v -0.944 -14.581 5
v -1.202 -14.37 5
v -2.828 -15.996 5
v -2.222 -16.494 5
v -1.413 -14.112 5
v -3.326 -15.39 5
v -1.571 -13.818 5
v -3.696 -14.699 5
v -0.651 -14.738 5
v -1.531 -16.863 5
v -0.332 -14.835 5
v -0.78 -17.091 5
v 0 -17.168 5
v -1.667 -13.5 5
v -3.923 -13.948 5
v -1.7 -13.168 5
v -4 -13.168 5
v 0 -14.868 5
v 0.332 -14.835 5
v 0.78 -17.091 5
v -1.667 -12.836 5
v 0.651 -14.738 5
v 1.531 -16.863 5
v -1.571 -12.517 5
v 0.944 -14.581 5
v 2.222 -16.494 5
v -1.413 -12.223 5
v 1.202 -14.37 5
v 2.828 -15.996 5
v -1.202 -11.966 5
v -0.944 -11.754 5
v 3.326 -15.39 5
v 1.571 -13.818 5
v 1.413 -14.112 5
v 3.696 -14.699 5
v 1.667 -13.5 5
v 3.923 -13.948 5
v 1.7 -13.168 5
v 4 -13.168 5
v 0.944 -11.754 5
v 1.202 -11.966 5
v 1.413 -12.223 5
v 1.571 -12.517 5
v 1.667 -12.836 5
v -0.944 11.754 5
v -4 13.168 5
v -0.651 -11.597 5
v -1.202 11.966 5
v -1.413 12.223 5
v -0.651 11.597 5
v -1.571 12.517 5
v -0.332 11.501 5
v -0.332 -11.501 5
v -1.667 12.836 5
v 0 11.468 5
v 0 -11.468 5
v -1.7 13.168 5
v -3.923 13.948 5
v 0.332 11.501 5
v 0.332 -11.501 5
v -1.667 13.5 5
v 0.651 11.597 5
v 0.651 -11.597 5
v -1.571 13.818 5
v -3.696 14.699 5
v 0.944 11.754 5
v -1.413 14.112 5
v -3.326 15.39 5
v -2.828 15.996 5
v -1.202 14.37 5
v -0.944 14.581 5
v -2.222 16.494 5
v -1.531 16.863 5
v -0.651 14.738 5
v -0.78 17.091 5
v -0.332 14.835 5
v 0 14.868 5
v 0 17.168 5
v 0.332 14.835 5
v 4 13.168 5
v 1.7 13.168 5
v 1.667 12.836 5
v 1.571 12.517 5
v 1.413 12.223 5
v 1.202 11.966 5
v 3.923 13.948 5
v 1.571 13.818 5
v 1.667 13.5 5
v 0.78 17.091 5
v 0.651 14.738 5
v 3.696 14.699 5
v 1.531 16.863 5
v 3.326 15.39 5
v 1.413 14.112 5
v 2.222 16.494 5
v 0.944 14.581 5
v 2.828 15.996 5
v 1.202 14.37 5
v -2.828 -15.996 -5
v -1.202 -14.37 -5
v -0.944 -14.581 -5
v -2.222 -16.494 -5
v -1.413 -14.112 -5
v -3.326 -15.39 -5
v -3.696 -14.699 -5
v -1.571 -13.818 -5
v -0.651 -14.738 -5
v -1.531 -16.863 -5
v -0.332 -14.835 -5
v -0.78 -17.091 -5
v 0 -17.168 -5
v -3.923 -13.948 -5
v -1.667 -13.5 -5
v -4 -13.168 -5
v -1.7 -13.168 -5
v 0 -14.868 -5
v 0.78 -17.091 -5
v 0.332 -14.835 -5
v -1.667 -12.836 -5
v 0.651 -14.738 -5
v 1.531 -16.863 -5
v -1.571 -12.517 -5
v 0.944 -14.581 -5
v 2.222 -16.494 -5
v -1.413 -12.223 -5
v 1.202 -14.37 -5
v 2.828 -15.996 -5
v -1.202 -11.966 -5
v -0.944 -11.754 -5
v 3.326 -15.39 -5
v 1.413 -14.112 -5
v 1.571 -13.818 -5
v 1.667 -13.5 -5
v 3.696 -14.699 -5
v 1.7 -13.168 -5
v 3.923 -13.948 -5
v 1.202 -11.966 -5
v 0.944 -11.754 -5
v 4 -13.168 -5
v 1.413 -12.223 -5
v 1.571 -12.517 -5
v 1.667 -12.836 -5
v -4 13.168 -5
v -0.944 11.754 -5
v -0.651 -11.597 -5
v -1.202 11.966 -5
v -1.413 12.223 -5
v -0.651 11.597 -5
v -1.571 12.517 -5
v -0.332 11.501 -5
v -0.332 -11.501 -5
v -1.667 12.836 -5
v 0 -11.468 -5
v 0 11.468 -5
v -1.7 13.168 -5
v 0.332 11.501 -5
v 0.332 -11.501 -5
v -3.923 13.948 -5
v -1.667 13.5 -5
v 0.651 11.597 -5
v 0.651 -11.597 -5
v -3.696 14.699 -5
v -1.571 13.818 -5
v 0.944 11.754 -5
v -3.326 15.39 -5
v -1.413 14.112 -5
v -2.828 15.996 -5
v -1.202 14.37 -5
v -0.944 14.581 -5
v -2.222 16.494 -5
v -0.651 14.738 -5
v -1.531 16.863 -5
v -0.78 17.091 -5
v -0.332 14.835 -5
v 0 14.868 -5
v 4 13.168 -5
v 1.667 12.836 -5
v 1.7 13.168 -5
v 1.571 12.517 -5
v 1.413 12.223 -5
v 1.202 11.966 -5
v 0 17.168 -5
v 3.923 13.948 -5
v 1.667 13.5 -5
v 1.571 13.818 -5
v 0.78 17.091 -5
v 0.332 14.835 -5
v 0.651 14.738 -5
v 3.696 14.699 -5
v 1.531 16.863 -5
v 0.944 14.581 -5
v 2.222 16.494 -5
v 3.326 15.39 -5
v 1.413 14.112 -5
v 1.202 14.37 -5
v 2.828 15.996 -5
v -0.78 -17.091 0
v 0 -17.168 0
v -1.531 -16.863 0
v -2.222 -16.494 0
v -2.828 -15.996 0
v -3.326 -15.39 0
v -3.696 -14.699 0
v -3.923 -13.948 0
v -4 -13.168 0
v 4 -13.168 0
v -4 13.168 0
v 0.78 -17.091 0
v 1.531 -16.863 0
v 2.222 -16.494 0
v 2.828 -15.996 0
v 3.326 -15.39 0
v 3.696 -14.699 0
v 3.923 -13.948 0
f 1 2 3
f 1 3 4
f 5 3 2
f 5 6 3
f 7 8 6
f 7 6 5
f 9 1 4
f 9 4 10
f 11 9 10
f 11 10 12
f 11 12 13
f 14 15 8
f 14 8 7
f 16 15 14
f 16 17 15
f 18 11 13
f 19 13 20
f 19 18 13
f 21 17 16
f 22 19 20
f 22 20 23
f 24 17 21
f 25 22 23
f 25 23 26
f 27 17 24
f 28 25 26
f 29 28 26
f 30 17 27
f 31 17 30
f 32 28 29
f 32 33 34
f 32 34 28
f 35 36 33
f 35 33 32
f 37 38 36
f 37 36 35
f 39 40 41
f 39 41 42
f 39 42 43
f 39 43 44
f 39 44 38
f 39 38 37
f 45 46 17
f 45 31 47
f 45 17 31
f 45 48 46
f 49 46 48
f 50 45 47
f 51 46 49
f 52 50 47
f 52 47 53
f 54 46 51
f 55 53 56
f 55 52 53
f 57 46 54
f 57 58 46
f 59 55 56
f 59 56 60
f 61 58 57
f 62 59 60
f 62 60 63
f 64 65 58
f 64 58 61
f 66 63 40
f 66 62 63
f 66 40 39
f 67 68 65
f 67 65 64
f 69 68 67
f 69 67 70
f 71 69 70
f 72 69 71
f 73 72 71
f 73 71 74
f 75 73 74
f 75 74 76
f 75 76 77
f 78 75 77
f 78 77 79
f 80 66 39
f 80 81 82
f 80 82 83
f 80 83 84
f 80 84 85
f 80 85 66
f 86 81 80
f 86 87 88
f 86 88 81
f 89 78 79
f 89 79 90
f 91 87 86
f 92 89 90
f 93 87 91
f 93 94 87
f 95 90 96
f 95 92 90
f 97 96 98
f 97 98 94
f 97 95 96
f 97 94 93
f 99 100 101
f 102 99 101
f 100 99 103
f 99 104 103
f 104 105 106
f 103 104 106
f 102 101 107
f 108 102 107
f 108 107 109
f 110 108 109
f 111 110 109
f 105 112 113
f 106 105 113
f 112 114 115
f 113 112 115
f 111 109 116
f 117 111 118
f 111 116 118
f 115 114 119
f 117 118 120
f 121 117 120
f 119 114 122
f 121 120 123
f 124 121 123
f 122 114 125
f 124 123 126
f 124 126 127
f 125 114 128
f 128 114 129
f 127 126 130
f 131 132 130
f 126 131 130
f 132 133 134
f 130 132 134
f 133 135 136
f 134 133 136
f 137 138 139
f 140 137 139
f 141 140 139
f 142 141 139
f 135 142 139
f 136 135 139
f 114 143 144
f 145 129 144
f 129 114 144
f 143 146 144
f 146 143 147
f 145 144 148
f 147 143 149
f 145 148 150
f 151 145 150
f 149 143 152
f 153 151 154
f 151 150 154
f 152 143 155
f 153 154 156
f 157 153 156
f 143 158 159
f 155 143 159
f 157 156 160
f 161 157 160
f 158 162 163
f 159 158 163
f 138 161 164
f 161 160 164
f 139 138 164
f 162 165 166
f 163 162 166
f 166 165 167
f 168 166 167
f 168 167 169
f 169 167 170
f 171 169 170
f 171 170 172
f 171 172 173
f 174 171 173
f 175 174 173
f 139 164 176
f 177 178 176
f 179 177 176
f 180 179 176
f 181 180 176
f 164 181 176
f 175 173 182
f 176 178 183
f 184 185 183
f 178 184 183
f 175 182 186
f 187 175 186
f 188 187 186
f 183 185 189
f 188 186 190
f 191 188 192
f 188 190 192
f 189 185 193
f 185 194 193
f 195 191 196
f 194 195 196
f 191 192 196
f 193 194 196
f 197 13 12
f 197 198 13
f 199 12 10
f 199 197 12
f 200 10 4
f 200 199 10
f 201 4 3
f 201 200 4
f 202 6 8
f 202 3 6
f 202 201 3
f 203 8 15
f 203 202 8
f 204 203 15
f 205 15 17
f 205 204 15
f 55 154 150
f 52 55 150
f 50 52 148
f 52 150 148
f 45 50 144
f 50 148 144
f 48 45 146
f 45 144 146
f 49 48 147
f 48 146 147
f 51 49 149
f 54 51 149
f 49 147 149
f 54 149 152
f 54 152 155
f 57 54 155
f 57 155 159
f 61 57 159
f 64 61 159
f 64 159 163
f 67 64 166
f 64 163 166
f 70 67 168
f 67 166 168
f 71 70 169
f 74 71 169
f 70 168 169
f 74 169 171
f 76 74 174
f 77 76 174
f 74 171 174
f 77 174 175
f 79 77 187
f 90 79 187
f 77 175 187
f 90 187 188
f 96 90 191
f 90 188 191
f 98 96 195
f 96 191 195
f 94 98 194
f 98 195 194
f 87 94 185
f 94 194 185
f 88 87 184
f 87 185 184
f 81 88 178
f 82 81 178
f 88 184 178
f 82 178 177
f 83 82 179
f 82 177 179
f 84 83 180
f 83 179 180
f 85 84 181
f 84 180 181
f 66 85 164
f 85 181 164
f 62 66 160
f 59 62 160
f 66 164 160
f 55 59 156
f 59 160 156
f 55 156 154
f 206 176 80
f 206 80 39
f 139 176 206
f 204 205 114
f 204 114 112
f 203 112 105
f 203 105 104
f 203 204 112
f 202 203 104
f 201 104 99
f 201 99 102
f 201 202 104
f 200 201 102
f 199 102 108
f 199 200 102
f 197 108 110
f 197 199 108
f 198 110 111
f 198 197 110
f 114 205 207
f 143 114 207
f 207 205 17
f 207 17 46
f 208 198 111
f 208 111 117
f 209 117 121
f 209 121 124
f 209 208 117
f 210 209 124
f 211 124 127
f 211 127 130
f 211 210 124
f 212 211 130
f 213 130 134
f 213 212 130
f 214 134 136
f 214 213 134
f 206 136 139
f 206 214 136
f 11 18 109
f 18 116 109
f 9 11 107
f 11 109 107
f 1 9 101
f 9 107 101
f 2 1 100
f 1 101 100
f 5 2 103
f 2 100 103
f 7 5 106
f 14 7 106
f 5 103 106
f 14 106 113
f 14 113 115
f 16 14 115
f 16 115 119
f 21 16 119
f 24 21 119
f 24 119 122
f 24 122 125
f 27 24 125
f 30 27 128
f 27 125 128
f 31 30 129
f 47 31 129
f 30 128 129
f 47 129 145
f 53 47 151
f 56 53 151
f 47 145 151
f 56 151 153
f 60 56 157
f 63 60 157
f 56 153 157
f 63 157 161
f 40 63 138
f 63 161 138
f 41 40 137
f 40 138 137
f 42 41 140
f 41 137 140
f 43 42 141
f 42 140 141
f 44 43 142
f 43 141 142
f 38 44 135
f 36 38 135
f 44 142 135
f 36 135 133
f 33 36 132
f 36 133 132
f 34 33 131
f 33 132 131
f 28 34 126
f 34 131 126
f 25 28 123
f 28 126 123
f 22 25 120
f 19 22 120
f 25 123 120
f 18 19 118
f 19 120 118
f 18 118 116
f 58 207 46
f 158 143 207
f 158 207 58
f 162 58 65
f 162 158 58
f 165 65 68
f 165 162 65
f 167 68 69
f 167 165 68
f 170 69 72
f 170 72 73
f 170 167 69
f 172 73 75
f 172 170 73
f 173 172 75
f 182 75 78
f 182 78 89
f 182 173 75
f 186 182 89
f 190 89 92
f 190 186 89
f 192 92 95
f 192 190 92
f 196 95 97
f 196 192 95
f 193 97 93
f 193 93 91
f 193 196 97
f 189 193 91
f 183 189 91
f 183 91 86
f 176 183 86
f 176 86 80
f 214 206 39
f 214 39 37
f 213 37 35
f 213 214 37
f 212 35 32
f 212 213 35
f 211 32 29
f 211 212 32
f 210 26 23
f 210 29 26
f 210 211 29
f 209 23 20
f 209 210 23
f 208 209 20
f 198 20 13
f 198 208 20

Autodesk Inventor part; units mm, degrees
ref_plane "YZ Plane" through (0, 0, 0) normal (1, 0, 0) x (0, 1, 0)
ref_plane "XZ Plane" through (0, 0, 0) normal (0, 1, 0) x (-1, 0, 0)
ref_plane "XY Plane" through (0, 0, 0) normal (0, 0, 1) x (1, 0, 0)
sketch "Sketch1" plane through (0, 0, 0) normal (0, 0, 1) x (1, 0, 0)
  line L0 (0, 17.1679) -> (0, 17.1679)
  line L1 (4, 13.1679) -> (4, -13.1679)
  line L2 (0, -17.1679) -> (0, -17.1679)
  line L3 (-4, -13.1679) -> (-4, 13.1679)
  line L4 (-4, 17.1679) -> (0, 17.1679) construction
  line L5 (0, 17.1679) -> (0, 0) construction
  line L6 (0, 0) -> (-4, 0) construction
  line L7 (-4, 0) -> (-4, 17.1679) construction
  arc A0 (4, 13.1679) -> (0, 17.1679) centre (0, 13.1679) ccw
  arc A1 (0, 17.1679) -> (-4, 13.1679) centre (0, 13.1679) ccw
  arc A2 (-4, -13.1679) -> (0, -17.1679) centre (0, -13.1679) ccw
  arc A3 (0, -17.1679) -> (4, -13.1679) centre (0, -13.1679) ccw
  dimension "d0" = 4
  dimension "d6" = 26.3358
extrude "Extrusion1" add sketch "Sketch1" along normal mid plane 10
sketch "Sketch2" plane through (0, 0, 5) normal (0, 0, 1) x (1, 0, 0)
  arc A0 (4, 13.1679) -> (-4, 13.1679) centre (0, 13.1679) ccw construction
  arc A1 (-4, -13.1679) -> (4, -13.1679) centre (0, -13.1679) ccw construction
  point P0 (0, 0)
hole "Hole1" at (0, 13.1679, 5) at (0, -13.1679, 5) direction (0, 0, -1) diameter 3.4 end through all clearance for "Socket Head Cap Screw" size "M3" standard "Ansi Metric M Profile"
equation "\"d6\" = LengthF"
equation "\"LengthF\" = 26.335787"
properties part number "F"
